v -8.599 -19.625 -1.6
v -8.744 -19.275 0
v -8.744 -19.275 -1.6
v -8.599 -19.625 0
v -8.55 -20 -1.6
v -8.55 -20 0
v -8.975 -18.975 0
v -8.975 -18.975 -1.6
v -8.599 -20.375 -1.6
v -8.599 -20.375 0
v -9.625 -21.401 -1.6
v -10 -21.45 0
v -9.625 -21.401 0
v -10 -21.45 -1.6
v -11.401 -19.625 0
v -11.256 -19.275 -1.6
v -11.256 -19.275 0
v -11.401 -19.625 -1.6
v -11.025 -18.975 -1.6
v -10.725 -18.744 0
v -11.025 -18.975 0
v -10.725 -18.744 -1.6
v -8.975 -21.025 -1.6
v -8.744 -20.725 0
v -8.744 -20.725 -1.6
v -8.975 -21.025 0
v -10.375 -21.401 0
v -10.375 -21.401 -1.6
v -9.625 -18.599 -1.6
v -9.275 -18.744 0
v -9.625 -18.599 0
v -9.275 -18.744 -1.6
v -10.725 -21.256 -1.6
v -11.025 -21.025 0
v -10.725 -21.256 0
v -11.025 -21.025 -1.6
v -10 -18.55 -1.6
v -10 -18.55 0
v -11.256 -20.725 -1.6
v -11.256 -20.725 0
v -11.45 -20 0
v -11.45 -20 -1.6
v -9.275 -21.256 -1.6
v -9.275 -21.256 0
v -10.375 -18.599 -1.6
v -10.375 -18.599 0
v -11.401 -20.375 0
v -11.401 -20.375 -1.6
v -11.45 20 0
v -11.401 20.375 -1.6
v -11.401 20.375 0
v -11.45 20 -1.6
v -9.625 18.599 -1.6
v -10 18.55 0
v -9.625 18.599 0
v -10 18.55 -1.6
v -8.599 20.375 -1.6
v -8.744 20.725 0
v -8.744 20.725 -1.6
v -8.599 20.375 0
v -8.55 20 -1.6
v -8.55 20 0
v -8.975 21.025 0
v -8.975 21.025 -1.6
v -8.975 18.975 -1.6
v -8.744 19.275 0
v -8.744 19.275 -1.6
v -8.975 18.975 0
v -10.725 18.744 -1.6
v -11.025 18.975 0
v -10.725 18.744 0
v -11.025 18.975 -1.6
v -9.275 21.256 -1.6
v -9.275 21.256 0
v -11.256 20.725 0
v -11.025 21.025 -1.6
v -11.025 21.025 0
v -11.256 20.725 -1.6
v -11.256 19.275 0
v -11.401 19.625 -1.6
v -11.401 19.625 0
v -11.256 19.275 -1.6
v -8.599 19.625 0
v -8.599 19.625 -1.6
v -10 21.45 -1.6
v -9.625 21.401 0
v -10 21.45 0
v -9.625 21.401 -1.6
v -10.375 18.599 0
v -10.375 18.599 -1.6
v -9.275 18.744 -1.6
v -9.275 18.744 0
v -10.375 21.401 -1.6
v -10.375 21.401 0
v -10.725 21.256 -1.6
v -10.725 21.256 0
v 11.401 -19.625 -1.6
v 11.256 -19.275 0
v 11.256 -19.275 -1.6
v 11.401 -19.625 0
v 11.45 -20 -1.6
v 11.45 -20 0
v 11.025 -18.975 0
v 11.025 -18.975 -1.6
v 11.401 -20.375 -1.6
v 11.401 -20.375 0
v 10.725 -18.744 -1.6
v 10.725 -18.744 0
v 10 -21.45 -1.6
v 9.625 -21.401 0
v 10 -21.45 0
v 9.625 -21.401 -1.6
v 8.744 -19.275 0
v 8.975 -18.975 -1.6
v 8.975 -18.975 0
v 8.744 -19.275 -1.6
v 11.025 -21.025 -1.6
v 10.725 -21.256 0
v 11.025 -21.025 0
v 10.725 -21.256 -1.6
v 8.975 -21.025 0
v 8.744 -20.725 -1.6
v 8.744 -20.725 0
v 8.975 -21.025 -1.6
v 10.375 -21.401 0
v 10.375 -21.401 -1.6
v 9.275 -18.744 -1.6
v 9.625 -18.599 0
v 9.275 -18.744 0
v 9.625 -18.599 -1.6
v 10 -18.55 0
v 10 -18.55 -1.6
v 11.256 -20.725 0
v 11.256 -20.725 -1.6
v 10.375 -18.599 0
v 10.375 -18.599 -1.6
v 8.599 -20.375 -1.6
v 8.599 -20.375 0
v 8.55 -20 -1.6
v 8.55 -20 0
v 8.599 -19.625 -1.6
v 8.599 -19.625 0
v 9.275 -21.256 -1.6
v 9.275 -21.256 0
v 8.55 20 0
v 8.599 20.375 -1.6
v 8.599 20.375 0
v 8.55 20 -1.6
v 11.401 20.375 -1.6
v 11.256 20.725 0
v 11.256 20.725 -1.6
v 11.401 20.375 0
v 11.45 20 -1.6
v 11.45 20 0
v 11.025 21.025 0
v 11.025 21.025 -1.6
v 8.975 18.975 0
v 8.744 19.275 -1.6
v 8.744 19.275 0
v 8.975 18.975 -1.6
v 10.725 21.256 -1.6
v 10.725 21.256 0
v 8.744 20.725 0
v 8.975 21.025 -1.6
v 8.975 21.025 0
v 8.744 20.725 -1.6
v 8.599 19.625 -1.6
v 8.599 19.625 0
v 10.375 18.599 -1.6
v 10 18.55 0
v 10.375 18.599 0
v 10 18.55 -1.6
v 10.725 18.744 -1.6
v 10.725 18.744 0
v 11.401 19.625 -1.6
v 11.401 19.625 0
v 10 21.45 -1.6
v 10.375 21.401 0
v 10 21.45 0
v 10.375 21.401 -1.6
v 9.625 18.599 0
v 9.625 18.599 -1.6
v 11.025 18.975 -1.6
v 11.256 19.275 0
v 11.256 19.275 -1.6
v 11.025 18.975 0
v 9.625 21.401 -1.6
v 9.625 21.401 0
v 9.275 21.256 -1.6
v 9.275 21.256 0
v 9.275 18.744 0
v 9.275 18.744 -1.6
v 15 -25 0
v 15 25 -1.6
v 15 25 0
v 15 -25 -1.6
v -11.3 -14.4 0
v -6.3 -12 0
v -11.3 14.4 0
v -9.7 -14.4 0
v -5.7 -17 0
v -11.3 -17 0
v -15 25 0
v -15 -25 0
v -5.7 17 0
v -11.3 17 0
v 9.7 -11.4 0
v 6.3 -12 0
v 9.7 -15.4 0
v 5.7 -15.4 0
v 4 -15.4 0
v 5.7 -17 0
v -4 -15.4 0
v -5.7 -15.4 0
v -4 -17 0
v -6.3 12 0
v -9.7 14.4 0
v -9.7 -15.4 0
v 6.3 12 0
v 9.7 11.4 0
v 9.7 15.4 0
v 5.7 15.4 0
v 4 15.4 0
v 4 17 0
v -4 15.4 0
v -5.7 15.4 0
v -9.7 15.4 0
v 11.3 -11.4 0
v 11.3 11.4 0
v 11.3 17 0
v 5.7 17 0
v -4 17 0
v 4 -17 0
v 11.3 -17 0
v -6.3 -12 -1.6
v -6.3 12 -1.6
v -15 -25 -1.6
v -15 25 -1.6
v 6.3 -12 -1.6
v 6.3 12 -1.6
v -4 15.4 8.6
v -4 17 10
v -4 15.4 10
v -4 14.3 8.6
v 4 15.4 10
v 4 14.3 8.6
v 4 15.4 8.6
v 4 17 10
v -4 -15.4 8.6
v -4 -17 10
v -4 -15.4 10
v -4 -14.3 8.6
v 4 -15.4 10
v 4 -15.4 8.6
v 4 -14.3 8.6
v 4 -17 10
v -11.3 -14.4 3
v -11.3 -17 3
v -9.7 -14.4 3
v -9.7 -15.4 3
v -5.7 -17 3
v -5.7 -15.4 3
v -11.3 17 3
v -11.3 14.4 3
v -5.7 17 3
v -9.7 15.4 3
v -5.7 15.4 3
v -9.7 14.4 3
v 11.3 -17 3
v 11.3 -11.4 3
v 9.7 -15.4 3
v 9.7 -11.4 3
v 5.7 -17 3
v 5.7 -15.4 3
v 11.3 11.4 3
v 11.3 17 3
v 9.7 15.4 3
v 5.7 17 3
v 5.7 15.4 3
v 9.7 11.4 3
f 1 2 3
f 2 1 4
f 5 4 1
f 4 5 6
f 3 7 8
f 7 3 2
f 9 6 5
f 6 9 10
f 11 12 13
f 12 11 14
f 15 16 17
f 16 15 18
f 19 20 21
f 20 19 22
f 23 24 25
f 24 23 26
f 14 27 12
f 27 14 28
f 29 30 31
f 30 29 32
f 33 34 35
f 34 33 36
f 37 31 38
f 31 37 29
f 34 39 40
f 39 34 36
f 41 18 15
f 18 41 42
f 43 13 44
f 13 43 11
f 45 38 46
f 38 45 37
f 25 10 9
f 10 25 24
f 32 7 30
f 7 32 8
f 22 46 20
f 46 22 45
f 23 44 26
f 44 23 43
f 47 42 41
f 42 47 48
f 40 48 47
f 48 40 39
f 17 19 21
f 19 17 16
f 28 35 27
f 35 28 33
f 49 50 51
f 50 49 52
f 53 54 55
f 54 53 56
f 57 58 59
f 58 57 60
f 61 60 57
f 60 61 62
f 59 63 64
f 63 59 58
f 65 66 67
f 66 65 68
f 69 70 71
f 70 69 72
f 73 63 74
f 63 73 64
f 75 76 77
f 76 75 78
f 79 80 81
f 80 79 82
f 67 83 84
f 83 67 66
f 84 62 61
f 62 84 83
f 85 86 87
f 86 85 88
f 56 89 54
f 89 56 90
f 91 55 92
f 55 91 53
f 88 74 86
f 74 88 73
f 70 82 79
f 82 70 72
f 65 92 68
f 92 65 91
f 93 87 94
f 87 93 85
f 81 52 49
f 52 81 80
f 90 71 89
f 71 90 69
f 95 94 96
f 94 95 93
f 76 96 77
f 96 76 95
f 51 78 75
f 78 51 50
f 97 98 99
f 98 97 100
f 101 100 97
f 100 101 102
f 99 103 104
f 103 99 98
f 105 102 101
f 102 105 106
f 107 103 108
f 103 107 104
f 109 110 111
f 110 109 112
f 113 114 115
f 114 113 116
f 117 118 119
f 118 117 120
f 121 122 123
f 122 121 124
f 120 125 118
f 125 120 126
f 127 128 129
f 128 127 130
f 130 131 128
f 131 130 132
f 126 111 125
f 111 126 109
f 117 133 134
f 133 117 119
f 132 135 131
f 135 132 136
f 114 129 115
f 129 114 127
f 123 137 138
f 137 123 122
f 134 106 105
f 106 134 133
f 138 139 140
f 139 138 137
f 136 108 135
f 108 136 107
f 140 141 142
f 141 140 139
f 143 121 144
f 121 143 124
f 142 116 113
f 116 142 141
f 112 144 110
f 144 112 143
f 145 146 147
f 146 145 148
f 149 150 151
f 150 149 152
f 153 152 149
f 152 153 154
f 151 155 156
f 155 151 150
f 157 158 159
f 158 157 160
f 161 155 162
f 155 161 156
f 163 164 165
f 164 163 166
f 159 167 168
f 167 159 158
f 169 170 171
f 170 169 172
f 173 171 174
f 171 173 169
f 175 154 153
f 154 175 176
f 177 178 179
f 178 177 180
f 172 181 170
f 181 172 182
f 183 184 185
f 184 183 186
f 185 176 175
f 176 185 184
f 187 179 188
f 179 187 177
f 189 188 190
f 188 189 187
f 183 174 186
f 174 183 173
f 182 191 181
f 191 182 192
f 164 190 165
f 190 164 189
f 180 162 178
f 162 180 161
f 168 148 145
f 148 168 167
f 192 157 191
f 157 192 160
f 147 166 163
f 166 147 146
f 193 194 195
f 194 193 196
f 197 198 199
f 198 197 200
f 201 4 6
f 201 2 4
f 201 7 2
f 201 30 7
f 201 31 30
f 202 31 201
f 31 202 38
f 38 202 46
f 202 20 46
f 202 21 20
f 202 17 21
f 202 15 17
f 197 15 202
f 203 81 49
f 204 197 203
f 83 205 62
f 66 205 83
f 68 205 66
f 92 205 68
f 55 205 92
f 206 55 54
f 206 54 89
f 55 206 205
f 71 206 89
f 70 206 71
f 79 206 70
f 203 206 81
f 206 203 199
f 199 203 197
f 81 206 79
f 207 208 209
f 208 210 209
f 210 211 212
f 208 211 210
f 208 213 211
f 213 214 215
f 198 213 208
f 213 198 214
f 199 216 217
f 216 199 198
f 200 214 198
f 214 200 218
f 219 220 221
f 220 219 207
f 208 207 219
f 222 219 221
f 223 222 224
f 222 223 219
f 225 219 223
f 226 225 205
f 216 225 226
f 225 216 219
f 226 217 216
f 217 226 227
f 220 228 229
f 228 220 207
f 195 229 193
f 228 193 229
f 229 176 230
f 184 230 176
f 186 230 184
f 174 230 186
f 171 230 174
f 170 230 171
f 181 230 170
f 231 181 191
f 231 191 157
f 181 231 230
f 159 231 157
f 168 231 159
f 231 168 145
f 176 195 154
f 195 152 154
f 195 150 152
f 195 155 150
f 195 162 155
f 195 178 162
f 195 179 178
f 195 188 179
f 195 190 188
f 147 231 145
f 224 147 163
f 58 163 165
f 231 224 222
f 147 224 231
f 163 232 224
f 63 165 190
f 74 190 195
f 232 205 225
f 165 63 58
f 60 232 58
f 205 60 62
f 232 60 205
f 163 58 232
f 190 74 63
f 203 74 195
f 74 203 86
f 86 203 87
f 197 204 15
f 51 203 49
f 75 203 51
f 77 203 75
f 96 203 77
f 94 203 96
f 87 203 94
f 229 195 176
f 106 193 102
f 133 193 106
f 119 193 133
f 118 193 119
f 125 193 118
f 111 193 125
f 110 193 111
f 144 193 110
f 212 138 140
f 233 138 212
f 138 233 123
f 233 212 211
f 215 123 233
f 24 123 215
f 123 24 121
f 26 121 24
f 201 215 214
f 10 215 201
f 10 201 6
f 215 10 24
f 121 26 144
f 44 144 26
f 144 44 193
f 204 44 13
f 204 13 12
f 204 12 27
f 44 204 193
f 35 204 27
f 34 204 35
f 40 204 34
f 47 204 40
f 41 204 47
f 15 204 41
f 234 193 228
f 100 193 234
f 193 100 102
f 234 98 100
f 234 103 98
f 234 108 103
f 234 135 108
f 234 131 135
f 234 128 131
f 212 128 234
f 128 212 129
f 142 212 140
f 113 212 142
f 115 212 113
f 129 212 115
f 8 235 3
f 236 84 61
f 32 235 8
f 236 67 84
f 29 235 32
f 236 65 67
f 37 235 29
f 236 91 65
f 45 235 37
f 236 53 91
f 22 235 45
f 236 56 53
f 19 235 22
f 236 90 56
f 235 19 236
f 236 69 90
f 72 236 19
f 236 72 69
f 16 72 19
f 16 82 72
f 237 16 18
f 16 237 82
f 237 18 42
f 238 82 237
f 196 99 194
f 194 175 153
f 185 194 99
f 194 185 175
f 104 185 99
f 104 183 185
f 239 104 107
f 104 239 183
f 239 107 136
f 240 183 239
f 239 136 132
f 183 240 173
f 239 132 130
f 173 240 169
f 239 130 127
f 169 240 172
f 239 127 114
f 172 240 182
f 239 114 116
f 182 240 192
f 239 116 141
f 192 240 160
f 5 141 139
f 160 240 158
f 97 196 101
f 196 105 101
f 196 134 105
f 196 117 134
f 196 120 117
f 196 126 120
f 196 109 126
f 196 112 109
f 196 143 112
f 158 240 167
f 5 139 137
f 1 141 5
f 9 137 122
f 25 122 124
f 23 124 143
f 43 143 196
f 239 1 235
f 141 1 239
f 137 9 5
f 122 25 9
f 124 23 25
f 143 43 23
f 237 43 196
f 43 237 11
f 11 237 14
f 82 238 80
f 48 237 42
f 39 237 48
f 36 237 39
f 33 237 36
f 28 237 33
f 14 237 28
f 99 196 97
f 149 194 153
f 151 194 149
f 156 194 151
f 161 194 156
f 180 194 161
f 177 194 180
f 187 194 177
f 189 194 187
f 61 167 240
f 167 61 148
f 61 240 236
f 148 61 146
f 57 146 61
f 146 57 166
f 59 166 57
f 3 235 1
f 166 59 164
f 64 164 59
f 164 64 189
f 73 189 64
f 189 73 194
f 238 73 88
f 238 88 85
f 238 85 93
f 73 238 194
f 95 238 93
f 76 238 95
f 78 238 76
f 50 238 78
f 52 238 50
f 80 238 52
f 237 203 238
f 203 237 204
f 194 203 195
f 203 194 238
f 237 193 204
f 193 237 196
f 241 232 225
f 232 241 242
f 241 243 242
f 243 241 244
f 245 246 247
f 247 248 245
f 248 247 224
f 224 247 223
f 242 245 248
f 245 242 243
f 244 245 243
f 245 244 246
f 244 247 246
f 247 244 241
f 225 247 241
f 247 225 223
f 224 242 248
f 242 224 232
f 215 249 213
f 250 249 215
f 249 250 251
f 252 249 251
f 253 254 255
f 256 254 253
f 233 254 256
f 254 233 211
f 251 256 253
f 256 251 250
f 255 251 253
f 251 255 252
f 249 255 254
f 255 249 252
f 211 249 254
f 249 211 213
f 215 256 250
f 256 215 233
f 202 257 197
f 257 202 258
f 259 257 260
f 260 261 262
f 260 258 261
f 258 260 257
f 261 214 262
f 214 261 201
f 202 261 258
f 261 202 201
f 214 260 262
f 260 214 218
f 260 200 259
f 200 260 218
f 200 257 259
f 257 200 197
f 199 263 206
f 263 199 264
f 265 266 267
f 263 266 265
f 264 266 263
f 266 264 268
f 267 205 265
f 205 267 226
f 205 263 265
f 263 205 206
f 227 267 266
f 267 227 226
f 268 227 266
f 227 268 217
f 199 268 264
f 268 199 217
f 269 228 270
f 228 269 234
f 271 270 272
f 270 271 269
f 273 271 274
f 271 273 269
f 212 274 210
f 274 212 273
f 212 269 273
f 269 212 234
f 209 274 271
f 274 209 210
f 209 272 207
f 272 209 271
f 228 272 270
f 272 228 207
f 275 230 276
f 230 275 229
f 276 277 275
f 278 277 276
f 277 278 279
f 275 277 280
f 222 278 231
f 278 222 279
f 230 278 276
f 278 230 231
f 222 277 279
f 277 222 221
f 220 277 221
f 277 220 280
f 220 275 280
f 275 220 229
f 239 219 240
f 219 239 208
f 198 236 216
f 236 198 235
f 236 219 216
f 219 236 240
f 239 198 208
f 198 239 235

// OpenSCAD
// file: ../../screw-post/screw-post.scad
//-----------------------------------------------------------------------
// Screw post: a round post off the floor that a board screws down onto
//
// Two ways to fix:
//   "nut"  clearance hole through the post and floor; the nut sits in a hex
//          trap in the floor's underside, so the screw goes in from the top
//   "tap"  a pilot hole the screw cuts its own thread in (one or two fittings
//          in PLA/PETG); blind, the floor stays whole underneath
// and "head" for a screw up from below (head in a counterbore, nut on top).
//
// Modules, all in the same frame:
//   screwPostGhost()     the screw (and nut), for previews
//   screwPost()          the post: add to the floor
//   screwPostFloorCut()  subtract from the floor: nut trap / counterbore and hole
//
// Frame: origin on the floor top, on the post's axis. Z up; the floor is
// Z = -floorThick .. 0. Units: mm.
//
// Sizes: "M2", "M2.5", "M3". screwPostScrew(size, ...) says which screw length
// reaches, so a project can assert it has that screw in the kit.
//-----------------------------------------------------------------------

//-- [name, screw Ø, nut across flats, nut thick, head Ø, head height, tap hole, post Ø]
//-- Nuts ISO 4032; heads ISO 7380 button. Tap holes: the usual ~0.8 x Ø for plastic
screwSizes = [
  ["M2",   2.0, 4.0, 1.6, 3.5, 1.1, 1.6, 5.0],
  ["M2.5", 2.5, 5.0, 2.0, 4.4, 1.4, 2.1, 6.0],    // head 4.4: measured on the kit's M2.5 (controller base)
  ["M3",   3.0, 5.5, 2.4, 5.7, 1.65, 2.5, 7.0],
];

screwHoleClear = 0.4;     // added to the screw Ø for a clearance hole
screwNutClear  = 0.3;     // CAL: across flats, nut trap over the nut. Set by the fit piece
screwTapClear  = 0.0;     // CAL: added to the tap hole. Set by the fit piece
screwHeadClear = 0.6;     // counterbore over the head Ø

function screwSize(size) = let (i = search([size], screwSizes)[0])
  assert(i != [] && i != undef, str("unknown screw size ", size)) screwSizes[i];
function screwDia(size)    = screwSize(size)[1];
function screwNutAF(size)  = screwSize(size)[2];
function screwNutH(size)   = screwSize(size)[3];
function screwHeadDia(size)= screwSize(size)[4];
function screwHeadH(size)  = screwSize(size)[5];
function screwPostDia(size)= screwSize(size)[7];

//-- Shortest screw that fills the nut, from the top of the clamped part (h + clamp
//-- above the floor) down to the nut trap's underside. Round up to a length you have.
function screwPostScrew(size, h, floorThick, clamp = 1.6) = h + clamp + floorThick;

module screwPostGhost(size, h, floorThick, clamp = 1.6, length, how = "nut")
{
  d = screwDia(size);
  L = is_undef(length) ? screwPostScrew(size, h, floorThick, clamp) : length;
  top = h + clamp;
  if (how == "head")
  {
    %color("Silver") translate([0, 0, -floorThick]) cylinder(d = screwHeadDia(size), h = screwHeadH(size), $fn = 24);
    %color("Silver") translate([0, 0, -floorThick + screwHeadH(size)]) cylinder(d = d, h = L, $fn = 16);
  }
  else
  {
    %color("Silver") translate([0, 0, top]) cylinder(d = screwHeadDia(size), h = screwHeadH(size), $fn = 24);
    %color("Silver") translate([0, 0, top - L]) cylinder(d = d, h = L, $fn = 16);
    if (how == "nut")
      %color("DimGray") translate([0, 0, -floorThick]) rotate([0, 0, 30]) cylinder(d = screwNutAF(size)/cos(30), h = screwNutH(size), $fn = 6);
  }
}

//-- how: "nut" | "head" (through hole) or "tap" (blind pilot hole). postDia defaults by size
module screwPost(size, h, how = "nut", postDia, tapClear = screwTapClear)
{
  pd = is_undef(postDia) ? screwPostDia(size) : postDia;
  hole = how == "tap" ? screwSize(size)[6] + tapClear : screwDia(size) + screwHoleClear;
  difference()
  {
    translate([0, 0, -0.01]) cylinder(d = pd, h = h + 0.01, $fn = 40);
    translate([0, 0, how == "tap" ? 0.6 : -1]) cylinder(d = hole, h = h + 2, $fn = 24);
    //-- lead-in so the screw starts square
    translate([0, 0, h - 0.4]) cylinder(d1 = hole, d2 = hole + 0.8, h = 0.41, $fn = 24);
  }
}

//-- "nut": hex trap from the underside, opening a little over the nut so it sits flush.
//-- "head": counterbore for the head. "tap": nothing.
module screwPostFloorCut(size, floorThick, how = "nut", nutClear = screwNutClear)
{
  d = screwDia(size) + screwHoleClear;
  if (how == "nut")
  {
    af = screwNutAF(size) + nutClear;
    translate([0, 0, -floorThick - 1]) rotate([0, 0, 30]) cylinder(d = af/cos(30), h = screwNutH(size) + 0.1 + 1, $fn = 6);
    translate([0, 0, -floorThick - 1]) cylinder(d = d + 0.4, h = floorThick + 2, $fn = 24);
  }
  if (how == "head")
  {
    translate([0, 0, -floorThick - 1]) cylinder(d = screwHeadDia(size) + screwHeadClear, h = screwHeadH(size) + 0.2 + 1, $fn = 32);
    translate([0, 0, -floorThick - 1]) cylinder(d = d + 0.4, h = floorThick + 2, $fn = 24);
  }
  assert(how == "tap" || floorThick >= (how == "nut" ? screwNutH(size) : screwHeadH(size)) + 0.1 + 0.3,
         str("floor too thin for the ", size, " ", how));
}
// main file
// The 221-415's clip on its carrier, for the catalogue: a 3 x 5 plate (30 x 50) with the
// clip on it, the plate opened under the body. Carrier frame: Z = 0 on the plate's top.
// The WAGO (views/wago.scad) drops in from above.
use <../wago-221.scad>

name = "221-415";

wagoCarrier(name);
